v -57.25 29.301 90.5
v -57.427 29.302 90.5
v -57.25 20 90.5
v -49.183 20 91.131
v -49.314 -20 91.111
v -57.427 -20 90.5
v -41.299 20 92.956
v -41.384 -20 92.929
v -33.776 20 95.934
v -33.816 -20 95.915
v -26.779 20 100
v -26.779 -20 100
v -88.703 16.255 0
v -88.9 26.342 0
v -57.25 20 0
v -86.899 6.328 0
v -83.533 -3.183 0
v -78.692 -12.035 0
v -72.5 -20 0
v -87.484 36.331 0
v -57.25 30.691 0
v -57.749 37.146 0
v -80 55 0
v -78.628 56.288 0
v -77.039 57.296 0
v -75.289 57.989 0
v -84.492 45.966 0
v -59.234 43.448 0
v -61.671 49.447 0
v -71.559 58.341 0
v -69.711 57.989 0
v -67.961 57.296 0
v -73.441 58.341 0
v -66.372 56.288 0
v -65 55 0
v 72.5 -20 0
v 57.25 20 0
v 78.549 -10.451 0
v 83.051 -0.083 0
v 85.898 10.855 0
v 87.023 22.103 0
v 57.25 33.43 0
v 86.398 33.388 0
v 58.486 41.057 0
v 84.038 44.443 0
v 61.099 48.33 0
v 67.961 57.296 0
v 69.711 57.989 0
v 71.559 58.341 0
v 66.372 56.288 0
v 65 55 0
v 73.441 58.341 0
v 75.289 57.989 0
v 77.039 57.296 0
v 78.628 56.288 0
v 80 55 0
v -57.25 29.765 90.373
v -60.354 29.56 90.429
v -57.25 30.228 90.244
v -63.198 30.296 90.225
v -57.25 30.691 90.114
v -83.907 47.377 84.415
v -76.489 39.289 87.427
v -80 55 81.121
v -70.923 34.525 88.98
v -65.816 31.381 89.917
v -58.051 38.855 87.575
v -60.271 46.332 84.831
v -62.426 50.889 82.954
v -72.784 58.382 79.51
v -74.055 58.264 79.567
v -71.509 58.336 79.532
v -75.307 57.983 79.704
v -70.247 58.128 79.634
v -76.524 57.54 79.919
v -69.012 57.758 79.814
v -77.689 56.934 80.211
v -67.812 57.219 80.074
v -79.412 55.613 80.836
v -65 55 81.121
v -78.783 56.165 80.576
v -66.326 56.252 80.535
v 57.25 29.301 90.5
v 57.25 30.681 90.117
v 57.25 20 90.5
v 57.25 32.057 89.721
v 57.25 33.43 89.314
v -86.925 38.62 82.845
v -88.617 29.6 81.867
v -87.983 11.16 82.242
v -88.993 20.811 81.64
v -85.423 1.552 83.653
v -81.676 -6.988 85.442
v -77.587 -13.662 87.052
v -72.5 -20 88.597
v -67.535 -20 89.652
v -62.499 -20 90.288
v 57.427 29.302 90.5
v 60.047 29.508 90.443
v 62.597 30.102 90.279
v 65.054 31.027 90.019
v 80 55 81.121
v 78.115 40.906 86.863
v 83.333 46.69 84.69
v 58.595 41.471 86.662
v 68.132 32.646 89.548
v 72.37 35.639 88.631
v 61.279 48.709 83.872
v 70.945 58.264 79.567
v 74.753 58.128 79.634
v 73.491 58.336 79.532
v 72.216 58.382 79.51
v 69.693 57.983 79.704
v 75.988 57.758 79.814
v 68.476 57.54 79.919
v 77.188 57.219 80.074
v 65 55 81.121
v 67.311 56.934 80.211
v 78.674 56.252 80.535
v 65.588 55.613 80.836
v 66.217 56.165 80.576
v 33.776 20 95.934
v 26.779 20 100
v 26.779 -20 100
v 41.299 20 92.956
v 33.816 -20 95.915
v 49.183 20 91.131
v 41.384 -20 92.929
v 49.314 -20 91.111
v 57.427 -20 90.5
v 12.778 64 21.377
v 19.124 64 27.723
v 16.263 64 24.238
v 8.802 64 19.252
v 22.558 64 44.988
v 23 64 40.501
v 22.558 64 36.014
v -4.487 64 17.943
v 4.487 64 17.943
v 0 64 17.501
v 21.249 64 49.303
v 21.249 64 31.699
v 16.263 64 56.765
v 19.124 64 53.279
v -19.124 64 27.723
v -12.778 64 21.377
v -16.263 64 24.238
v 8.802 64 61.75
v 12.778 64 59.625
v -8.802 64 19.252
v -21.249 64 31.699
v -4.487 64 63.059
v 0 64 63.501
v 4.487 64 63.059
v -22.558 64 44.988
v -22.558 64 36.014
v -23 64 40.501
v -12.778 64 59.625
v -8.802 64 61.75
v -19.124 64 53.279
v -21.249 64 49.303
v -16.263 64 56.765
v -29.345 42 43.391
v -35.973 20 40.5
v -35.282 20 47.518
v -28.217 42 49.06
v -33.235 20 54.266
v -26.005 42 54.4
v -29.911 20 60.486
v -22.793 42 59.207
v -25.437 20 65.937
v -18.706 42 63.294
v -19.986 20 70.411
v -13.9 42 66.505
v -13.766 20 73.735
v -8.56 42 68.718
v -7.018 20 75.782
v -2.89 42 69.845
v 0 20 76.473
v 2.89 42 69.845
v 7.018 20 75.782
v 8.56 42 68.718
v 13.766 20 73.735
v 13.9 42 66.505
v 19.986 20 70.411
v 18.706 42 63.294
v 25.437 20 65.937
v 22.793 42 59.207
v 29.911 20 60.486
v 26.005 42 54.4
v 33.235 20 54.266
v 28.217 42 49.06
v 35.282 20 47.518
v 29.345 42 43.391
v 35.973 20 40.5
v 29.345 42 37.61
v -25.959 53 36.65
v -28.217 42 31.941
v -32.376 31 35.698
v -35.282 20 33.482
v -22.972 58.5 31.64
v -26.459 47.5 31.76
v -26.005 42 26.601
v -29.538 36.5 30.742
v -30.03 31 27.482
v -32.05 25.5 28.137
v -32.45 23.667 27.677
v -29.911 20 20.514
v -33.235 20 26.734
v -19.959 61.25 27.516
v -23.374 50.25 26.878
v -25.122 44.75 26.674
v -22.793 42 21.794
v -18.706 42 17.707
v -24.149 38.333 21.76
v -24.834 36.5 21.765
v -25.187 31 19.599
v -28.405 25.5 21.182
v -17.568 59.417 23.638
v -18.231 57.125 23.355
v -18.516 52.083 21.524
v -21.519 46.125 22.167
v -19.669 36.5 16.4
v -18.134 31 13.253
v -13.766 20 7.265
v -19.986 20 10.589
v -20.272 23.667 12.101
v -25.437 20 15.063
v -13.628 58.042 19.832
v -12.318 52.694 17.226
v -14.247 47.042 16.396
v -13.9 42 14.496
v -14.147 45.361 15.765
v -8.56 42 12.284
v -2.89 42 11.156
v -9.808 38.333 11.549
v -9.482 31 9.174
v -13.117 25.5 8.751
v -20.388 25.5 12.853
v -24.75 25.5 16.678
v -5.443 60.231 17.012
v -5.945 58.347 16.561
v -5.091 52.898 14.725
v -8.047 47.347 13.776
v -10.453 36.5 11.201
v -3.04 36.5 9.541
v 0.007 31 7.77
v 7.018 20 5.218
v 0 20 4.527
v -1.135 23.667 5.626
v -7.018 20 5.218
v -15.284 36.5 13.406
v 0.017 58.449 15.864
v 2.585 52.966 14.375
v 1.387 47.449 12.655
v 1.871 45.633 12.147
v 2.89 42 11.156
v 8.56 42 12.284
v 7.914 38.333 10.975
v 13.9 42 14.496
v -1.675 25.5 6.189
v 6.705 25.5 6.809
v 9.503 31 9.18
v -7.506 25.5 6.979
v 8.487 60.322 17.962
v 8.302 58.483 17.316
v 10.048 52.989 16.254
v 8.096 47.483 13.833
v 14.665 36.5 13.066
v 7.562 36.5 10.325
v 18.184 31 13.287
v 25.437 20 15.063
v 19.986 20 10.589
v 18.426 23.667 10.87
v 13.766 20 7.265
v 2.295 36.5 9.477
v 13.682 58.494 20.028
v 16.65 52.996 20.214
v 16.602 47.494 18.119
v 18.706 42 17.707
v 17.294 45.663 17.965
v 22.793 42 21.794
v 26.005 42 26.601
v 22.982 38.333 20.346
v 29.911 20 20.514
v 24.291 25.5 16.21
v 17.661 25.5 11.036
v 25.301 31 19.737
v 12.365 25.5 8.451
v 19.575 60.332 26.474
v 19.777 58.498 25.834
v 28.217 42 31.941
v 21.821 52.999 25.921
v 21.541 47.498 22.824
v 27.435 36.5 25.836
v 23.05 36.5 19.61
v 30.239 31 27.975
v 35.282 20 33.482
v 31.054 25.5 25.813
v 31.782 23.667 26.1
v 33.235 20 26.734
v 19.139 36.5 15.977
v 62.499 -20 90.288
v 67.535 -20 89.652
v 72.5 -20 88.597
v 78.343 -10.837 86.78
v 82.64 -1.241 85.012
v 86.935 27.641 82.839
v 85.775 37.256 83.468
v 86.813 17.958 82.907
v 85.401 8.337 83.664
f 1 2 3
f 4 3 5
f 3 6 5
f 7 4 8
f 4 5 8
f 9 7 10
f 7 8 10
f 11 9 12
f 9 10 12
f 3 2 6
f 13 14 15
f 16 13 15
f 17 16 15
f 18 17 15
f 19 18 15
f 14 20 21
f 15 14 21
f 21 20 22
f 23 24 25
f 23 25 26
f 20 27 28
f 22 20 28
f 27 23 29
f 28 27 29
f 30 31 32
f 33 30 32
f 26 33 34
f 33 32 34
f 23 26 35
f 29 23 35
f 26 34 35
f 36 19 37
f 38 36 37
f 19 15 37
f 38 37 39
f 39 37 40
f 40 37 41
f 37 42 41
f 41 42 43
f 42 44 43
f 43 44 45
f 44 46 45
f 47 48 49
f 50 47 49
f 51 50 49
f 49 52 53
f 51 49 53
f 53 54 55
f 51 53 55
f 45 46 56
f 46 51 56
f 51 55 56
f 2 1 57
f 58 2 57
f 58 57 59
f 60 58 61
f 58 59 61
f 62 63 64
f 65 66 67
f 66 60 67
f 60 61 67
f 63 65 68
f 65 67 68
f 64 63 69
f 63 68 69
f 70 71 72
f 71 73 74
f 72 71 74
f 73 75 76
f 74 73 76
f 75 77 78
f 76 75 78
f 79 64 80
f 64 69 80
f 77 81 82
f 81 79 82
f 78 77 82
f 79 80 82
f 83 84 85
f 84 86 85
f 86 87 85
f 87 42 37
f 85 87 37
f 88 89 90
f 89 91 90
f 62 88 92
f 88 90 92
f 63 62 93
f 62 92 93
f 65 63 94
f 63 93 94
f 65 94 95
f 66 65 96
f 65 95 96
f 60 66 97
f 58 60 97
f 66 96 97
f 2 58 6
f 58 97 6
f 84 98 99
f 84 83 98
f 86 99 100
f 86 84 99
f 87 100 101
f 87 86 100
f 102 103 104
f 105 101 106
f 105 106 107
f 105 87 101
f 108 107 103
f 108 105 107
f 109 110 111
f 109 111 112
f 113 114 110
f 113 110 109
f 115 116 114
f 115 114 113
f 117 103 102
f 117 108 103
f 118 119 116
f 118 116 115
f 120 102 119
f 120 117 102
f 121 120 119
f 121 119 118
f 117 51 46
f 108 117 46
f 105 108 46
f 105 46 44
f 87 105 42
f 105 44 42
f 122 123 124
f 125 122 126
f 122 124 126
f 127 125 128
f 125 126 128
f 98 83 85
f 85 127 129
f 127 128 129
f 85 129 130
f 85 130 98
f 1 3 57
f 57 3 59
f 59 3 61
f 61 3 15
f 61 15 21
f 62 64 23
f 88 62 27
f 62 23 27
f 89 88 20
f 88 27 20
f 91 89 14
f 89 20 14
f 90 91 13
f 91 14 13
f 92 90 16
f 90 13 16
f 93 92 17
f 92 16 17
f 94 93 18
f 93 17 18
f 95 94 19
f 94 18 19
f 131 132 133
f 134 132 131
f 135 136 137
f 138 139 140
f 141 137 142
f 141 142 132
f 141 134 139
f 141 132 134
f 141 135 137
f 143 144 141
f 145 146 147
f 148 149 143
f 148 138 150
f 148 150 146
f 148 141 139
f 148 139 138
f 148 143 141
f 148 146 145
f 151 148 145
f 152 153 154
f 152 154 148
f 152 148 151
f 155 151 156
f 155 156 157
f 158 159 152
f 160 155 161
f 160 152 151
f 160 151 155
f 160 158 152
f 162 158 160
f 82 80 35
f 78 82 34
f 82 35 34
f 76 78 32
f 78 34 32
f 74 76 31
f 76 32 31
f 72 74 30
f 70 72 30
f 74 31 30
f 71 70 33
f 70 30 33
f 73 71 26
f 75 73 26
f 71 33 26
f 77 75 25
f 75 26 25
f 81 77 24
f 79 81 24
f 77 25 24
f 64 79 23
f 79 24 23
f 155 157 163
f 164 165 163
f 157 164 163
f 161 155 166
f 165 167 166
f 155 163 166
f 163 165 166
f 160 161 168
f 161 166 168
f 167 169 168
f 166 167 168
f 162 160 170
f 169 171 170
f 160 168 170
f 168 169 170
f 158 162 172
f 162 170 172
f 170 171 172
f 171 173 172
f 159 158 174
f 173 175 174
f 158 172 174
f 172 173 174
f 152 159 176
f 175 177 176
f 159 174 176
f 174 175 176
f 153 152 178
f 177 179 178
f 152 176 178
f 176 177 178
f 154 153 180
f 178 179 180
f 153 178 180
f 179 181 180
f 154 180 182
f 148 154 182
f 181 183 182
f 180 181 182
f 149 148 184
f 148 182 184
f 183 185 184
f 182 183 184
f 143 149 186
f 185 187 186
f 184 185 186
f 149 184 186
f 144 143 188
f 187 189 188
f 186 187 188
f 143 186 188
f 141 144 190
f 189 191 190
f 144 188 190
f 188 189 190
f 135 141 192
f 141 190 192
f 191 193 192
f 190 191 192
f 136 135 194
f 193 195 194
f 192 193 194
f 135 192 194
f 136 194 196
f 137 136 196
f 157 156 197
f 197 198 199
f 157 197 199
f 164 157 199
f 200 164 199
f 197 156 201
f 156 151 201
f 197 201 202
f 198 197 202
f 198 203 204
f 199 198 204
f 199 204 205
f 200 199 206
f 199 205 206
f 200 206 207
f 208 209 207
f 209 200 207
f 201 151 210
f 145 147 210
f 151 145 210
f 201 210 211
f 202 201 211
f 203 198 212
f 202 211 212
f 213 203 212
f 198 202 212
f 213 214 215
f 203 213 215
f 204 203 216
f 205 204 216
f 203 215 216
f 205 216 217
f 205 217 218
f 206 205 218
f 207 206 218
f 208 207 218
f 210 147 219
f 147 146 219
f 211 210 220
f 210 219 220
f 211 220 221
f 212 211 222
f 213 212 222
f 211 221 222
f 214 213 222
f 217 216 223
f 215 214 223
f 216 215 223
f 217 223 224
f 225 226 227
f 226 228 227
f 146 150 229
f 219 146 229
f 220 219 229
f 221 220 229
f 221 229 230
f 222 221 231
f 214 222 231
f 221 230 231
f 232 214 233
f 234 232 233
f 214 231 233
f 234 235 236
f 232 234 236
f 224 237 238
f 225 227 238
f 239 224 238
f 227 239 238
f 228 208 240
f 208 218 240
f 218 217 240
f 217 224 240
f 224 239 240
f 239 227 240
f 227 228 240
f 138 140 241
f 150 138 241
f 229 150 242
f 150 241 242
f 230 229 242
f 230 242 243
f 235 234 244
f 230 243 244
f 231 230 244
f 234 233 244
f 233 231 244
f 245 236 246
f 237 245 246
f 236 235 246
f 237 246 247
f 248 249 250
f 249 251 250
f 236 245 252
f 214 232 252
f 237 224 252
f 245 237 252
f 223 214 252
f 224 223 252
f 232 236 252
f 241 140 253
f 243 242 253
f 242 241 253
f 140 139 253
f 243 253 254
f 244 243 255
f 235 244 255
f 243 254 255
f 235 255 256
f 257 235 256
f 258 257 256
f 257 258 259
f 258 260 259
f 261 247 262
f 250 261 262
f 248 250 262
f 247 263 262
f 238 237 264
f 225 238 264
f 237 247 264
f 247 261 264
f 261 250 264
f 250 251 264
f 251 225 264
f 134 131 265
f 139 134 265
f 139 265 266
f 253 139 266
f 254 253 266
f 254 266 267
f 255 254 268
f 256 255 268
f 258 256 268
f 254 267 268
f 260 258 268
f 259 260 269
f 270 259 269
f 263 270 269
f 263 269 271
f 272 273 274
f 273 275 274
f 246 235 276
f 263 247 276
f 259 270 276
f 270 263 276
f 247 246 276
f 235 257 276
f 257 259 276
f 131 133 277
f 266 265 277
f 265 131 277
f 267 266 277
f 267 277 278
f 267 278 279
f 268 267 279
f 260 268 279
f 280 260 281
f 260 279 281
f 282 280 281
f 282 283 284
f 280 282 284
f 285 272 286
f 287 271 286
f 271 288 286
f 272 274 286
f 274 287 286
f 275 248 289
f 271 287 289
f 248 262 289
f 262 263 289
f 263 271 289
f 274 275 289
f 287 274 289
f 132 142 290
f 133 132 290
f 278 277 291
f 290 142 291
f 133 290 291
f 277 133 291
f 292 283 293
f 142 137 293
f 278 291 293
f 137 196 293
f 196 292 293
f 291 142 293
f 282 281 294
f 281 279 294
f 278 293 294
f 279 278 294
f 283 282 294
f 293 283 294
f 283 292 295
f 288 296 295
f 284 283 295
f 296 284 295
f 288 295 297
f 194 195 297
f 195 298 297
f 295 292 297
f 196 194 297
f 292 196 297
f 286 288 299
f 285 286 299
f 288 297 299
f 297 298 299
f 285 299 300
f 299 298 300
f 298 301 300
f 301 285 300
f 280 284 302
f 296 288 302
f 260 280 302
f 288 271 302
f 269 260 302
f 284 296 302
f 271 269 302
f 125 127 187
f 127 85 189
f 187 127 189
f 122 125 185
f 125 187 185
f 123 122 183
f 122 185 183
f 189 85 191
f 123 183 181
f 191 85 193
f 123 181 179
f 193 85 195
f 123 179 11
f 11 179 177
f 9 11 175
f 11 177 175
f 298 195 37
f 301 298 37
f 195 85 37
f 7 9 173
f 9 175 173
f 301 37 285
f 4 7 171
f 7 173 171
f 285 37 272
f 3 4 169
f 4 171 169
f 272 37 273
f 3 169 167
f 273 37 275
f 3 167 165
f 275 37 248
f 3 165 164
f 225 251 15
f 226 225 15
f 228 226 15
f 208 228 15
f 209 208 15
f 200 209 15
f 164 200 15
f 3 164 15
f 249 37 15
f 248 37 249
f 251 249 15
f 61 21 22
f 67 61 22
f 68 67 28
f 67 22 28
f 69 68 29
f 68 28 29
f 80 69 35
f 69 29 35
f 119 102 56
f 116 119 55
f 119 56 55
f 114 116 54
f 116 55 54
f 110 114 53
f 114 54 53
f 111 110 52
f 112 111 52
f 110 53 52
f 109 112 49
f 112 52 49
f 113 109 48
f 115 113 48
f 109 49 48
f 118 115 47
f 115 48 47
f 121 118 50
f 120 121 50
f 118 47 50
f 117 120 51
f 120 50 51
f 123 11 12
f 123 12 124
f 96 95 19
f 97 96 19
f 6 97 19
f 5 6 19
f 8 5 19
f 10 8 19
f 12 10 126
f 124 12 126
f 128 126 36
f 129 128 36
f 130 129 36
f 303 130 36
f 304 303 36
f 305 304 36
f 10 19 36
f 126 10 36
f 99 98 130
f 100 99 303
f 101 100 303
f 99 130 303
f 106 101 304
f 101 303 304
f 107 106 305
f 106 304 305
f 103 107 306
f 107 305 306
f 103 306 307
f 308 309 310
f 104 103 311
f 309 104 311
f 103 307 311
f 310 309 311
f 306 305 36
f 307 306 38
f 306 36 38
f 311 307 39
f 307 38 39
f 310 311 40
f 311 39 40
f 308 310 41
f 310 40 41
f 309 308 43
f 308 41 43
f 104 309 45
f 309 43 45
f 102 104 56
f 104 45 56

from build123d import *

# Parameters (mm, degrees)
F1_DEPTH      = 100
F3_DEPTH      = 98.6
F5_DEPTH      = 90.4
F5_DEPTH_BACK = 126
F7_R          = 1.588882932
F8_DEPTH      = 43
F9_R          = 23
F10_DEPTH     = 1
F10_FACE_R    = 23
F6_R          = 35.9732862146


with BuildPart() as f1:
    # F0 (on Top) → F1 (new body)
    with BuildSketch(Plane.XY):
        with BuildLine():
            Line((-72.5, -20), (72.5, -20))
            ThreePointArc((72.5, -20), (86.678490298, 16.4571509702), (80, 55))
            ThreePointArc((80, 55), (72.5, 58.3856217223), (65, 55))
            ThreePointArc((65, 55), (59.6251005185, 44.7536715994), (57.25, 33.4295518696))
            Line((57.25, 33.4295518696), (57.25, 20))
            Line((57.25, 20), (52.2593490829, 20))
            Line((52.2593490829, 20), (-57.25, 20))
            Line((-57.25, 20), (-57.25, 30.6907939249))
            ThreePointArc((-57.25, 30.6907939249), (-59.2343780506, 43.4481447471), (-65, 55))
            ThreePointArc((-65, 55), (-72.5, 58.3856217223), (-80, 55))
            ThreePointArc((-80, 55), (-88.7033607571, 16.2546639243), (-72.5, -20))
        make_face()
    extrude(amount=F1_DEPTH)

    # F2 (on face) → F3 (cut)
    with BuildSketch(Plane.XZ.offset(20)):
        with BuildLine():
            ThreePointArc((-57.4272125959, 90.5), (-41.3839754635, 92.9294628197), (-26.7793443054, 100))
            Line((-26.7793443054, 100), (-94.0743684769, 100))
            Line((-94.0743684769, 100), (-90.0195017457, 81))
            ThreePointArc((-90.0195017457, 81), (-74.4015116391, 88.0765901597), (-57.4272125959, 90.5))
        make_face()
        with BuildLine():
            Line((90.444765985, 100), (26.7793443054, 100))
            ThreePointArc((26.7793443054, 100), (41.3839754635, 92.9294628197), (57.4272125959, 90.5))
            ThreePointArc((57.4272125959, 90.5), (74.4015116391, 88.0765901597), (90.0195017457, 81))
            Line((90.0195017457, 81), (90.444765985, 100))
        make_face()
    extrude(amount=-F3_DEPTH, mode=Mode.SUBTRACT)

    # F4 (on Right) → F5 (cut, two sides)
    with BuildSketch(Plane.YZ) as f5_sk:
        with BuildLine():
            ThreePointArc((24.7983019799, 91.6626080871), (46.3463766624, 84.825875611), (66.7543932796, 75.1009956002))
            Line((66.7543932796, 75.1009956002), (66.7543932796, 98.7012907863))
            Line((66.7543932796, 98.7012907863), (24.7983019799, 98.7012907863))
            Line((24.7983019799, 98.7012907863), (24.7983019799, 91.6626080871))
        make_face()
    extrude(amount=-F5_DEPTH, mode=Mode.SUBTRACT)
    extrude(f5_sk.sketch, amount=F5_DEPTH_BACK, mode=Mode.SUBTRACT)

    # F7 (on face) → F8 (join)
    with BuildSketch(Plane(origin=(0, 20, 0), x_dir=(-1, 0, 0), z_dir=(0, 1, 0))):
        with Locations((0, 40.5010841787)):
            Circle(F7_R)
    extrude(amount=F8_DEPTH)

    # F9 (on face) → F10 (join)
    with BuildSketch(Plane(origin=(0, 63, 0), x_dir=(-1, 0, 0), z_dir=(0, 1, 0))):
        with Locations((0, 40.5010841787)):
            Circle(F9_R)
    extrude(amount=F10_DEPTH)

    # F10_face (on face) → F11 section 0
    with BuildSketch(Plane(origin=(0, 64, 40.5010841787), x_dir=(-1, 0, 0), z_dir=(0, 1, 0))):
        Circle(F10_FACE_R)
    # F6 (on face) → F11 section 1
    with BuildSketch(Plane(origin=(0, 20, 0), x_dir=(-1, 0, 0), z_dir=(0, 1, 0))):
        with Locations((0, 40.5)):
            Circle(F6_R)
    loft()


solid = f1.part
